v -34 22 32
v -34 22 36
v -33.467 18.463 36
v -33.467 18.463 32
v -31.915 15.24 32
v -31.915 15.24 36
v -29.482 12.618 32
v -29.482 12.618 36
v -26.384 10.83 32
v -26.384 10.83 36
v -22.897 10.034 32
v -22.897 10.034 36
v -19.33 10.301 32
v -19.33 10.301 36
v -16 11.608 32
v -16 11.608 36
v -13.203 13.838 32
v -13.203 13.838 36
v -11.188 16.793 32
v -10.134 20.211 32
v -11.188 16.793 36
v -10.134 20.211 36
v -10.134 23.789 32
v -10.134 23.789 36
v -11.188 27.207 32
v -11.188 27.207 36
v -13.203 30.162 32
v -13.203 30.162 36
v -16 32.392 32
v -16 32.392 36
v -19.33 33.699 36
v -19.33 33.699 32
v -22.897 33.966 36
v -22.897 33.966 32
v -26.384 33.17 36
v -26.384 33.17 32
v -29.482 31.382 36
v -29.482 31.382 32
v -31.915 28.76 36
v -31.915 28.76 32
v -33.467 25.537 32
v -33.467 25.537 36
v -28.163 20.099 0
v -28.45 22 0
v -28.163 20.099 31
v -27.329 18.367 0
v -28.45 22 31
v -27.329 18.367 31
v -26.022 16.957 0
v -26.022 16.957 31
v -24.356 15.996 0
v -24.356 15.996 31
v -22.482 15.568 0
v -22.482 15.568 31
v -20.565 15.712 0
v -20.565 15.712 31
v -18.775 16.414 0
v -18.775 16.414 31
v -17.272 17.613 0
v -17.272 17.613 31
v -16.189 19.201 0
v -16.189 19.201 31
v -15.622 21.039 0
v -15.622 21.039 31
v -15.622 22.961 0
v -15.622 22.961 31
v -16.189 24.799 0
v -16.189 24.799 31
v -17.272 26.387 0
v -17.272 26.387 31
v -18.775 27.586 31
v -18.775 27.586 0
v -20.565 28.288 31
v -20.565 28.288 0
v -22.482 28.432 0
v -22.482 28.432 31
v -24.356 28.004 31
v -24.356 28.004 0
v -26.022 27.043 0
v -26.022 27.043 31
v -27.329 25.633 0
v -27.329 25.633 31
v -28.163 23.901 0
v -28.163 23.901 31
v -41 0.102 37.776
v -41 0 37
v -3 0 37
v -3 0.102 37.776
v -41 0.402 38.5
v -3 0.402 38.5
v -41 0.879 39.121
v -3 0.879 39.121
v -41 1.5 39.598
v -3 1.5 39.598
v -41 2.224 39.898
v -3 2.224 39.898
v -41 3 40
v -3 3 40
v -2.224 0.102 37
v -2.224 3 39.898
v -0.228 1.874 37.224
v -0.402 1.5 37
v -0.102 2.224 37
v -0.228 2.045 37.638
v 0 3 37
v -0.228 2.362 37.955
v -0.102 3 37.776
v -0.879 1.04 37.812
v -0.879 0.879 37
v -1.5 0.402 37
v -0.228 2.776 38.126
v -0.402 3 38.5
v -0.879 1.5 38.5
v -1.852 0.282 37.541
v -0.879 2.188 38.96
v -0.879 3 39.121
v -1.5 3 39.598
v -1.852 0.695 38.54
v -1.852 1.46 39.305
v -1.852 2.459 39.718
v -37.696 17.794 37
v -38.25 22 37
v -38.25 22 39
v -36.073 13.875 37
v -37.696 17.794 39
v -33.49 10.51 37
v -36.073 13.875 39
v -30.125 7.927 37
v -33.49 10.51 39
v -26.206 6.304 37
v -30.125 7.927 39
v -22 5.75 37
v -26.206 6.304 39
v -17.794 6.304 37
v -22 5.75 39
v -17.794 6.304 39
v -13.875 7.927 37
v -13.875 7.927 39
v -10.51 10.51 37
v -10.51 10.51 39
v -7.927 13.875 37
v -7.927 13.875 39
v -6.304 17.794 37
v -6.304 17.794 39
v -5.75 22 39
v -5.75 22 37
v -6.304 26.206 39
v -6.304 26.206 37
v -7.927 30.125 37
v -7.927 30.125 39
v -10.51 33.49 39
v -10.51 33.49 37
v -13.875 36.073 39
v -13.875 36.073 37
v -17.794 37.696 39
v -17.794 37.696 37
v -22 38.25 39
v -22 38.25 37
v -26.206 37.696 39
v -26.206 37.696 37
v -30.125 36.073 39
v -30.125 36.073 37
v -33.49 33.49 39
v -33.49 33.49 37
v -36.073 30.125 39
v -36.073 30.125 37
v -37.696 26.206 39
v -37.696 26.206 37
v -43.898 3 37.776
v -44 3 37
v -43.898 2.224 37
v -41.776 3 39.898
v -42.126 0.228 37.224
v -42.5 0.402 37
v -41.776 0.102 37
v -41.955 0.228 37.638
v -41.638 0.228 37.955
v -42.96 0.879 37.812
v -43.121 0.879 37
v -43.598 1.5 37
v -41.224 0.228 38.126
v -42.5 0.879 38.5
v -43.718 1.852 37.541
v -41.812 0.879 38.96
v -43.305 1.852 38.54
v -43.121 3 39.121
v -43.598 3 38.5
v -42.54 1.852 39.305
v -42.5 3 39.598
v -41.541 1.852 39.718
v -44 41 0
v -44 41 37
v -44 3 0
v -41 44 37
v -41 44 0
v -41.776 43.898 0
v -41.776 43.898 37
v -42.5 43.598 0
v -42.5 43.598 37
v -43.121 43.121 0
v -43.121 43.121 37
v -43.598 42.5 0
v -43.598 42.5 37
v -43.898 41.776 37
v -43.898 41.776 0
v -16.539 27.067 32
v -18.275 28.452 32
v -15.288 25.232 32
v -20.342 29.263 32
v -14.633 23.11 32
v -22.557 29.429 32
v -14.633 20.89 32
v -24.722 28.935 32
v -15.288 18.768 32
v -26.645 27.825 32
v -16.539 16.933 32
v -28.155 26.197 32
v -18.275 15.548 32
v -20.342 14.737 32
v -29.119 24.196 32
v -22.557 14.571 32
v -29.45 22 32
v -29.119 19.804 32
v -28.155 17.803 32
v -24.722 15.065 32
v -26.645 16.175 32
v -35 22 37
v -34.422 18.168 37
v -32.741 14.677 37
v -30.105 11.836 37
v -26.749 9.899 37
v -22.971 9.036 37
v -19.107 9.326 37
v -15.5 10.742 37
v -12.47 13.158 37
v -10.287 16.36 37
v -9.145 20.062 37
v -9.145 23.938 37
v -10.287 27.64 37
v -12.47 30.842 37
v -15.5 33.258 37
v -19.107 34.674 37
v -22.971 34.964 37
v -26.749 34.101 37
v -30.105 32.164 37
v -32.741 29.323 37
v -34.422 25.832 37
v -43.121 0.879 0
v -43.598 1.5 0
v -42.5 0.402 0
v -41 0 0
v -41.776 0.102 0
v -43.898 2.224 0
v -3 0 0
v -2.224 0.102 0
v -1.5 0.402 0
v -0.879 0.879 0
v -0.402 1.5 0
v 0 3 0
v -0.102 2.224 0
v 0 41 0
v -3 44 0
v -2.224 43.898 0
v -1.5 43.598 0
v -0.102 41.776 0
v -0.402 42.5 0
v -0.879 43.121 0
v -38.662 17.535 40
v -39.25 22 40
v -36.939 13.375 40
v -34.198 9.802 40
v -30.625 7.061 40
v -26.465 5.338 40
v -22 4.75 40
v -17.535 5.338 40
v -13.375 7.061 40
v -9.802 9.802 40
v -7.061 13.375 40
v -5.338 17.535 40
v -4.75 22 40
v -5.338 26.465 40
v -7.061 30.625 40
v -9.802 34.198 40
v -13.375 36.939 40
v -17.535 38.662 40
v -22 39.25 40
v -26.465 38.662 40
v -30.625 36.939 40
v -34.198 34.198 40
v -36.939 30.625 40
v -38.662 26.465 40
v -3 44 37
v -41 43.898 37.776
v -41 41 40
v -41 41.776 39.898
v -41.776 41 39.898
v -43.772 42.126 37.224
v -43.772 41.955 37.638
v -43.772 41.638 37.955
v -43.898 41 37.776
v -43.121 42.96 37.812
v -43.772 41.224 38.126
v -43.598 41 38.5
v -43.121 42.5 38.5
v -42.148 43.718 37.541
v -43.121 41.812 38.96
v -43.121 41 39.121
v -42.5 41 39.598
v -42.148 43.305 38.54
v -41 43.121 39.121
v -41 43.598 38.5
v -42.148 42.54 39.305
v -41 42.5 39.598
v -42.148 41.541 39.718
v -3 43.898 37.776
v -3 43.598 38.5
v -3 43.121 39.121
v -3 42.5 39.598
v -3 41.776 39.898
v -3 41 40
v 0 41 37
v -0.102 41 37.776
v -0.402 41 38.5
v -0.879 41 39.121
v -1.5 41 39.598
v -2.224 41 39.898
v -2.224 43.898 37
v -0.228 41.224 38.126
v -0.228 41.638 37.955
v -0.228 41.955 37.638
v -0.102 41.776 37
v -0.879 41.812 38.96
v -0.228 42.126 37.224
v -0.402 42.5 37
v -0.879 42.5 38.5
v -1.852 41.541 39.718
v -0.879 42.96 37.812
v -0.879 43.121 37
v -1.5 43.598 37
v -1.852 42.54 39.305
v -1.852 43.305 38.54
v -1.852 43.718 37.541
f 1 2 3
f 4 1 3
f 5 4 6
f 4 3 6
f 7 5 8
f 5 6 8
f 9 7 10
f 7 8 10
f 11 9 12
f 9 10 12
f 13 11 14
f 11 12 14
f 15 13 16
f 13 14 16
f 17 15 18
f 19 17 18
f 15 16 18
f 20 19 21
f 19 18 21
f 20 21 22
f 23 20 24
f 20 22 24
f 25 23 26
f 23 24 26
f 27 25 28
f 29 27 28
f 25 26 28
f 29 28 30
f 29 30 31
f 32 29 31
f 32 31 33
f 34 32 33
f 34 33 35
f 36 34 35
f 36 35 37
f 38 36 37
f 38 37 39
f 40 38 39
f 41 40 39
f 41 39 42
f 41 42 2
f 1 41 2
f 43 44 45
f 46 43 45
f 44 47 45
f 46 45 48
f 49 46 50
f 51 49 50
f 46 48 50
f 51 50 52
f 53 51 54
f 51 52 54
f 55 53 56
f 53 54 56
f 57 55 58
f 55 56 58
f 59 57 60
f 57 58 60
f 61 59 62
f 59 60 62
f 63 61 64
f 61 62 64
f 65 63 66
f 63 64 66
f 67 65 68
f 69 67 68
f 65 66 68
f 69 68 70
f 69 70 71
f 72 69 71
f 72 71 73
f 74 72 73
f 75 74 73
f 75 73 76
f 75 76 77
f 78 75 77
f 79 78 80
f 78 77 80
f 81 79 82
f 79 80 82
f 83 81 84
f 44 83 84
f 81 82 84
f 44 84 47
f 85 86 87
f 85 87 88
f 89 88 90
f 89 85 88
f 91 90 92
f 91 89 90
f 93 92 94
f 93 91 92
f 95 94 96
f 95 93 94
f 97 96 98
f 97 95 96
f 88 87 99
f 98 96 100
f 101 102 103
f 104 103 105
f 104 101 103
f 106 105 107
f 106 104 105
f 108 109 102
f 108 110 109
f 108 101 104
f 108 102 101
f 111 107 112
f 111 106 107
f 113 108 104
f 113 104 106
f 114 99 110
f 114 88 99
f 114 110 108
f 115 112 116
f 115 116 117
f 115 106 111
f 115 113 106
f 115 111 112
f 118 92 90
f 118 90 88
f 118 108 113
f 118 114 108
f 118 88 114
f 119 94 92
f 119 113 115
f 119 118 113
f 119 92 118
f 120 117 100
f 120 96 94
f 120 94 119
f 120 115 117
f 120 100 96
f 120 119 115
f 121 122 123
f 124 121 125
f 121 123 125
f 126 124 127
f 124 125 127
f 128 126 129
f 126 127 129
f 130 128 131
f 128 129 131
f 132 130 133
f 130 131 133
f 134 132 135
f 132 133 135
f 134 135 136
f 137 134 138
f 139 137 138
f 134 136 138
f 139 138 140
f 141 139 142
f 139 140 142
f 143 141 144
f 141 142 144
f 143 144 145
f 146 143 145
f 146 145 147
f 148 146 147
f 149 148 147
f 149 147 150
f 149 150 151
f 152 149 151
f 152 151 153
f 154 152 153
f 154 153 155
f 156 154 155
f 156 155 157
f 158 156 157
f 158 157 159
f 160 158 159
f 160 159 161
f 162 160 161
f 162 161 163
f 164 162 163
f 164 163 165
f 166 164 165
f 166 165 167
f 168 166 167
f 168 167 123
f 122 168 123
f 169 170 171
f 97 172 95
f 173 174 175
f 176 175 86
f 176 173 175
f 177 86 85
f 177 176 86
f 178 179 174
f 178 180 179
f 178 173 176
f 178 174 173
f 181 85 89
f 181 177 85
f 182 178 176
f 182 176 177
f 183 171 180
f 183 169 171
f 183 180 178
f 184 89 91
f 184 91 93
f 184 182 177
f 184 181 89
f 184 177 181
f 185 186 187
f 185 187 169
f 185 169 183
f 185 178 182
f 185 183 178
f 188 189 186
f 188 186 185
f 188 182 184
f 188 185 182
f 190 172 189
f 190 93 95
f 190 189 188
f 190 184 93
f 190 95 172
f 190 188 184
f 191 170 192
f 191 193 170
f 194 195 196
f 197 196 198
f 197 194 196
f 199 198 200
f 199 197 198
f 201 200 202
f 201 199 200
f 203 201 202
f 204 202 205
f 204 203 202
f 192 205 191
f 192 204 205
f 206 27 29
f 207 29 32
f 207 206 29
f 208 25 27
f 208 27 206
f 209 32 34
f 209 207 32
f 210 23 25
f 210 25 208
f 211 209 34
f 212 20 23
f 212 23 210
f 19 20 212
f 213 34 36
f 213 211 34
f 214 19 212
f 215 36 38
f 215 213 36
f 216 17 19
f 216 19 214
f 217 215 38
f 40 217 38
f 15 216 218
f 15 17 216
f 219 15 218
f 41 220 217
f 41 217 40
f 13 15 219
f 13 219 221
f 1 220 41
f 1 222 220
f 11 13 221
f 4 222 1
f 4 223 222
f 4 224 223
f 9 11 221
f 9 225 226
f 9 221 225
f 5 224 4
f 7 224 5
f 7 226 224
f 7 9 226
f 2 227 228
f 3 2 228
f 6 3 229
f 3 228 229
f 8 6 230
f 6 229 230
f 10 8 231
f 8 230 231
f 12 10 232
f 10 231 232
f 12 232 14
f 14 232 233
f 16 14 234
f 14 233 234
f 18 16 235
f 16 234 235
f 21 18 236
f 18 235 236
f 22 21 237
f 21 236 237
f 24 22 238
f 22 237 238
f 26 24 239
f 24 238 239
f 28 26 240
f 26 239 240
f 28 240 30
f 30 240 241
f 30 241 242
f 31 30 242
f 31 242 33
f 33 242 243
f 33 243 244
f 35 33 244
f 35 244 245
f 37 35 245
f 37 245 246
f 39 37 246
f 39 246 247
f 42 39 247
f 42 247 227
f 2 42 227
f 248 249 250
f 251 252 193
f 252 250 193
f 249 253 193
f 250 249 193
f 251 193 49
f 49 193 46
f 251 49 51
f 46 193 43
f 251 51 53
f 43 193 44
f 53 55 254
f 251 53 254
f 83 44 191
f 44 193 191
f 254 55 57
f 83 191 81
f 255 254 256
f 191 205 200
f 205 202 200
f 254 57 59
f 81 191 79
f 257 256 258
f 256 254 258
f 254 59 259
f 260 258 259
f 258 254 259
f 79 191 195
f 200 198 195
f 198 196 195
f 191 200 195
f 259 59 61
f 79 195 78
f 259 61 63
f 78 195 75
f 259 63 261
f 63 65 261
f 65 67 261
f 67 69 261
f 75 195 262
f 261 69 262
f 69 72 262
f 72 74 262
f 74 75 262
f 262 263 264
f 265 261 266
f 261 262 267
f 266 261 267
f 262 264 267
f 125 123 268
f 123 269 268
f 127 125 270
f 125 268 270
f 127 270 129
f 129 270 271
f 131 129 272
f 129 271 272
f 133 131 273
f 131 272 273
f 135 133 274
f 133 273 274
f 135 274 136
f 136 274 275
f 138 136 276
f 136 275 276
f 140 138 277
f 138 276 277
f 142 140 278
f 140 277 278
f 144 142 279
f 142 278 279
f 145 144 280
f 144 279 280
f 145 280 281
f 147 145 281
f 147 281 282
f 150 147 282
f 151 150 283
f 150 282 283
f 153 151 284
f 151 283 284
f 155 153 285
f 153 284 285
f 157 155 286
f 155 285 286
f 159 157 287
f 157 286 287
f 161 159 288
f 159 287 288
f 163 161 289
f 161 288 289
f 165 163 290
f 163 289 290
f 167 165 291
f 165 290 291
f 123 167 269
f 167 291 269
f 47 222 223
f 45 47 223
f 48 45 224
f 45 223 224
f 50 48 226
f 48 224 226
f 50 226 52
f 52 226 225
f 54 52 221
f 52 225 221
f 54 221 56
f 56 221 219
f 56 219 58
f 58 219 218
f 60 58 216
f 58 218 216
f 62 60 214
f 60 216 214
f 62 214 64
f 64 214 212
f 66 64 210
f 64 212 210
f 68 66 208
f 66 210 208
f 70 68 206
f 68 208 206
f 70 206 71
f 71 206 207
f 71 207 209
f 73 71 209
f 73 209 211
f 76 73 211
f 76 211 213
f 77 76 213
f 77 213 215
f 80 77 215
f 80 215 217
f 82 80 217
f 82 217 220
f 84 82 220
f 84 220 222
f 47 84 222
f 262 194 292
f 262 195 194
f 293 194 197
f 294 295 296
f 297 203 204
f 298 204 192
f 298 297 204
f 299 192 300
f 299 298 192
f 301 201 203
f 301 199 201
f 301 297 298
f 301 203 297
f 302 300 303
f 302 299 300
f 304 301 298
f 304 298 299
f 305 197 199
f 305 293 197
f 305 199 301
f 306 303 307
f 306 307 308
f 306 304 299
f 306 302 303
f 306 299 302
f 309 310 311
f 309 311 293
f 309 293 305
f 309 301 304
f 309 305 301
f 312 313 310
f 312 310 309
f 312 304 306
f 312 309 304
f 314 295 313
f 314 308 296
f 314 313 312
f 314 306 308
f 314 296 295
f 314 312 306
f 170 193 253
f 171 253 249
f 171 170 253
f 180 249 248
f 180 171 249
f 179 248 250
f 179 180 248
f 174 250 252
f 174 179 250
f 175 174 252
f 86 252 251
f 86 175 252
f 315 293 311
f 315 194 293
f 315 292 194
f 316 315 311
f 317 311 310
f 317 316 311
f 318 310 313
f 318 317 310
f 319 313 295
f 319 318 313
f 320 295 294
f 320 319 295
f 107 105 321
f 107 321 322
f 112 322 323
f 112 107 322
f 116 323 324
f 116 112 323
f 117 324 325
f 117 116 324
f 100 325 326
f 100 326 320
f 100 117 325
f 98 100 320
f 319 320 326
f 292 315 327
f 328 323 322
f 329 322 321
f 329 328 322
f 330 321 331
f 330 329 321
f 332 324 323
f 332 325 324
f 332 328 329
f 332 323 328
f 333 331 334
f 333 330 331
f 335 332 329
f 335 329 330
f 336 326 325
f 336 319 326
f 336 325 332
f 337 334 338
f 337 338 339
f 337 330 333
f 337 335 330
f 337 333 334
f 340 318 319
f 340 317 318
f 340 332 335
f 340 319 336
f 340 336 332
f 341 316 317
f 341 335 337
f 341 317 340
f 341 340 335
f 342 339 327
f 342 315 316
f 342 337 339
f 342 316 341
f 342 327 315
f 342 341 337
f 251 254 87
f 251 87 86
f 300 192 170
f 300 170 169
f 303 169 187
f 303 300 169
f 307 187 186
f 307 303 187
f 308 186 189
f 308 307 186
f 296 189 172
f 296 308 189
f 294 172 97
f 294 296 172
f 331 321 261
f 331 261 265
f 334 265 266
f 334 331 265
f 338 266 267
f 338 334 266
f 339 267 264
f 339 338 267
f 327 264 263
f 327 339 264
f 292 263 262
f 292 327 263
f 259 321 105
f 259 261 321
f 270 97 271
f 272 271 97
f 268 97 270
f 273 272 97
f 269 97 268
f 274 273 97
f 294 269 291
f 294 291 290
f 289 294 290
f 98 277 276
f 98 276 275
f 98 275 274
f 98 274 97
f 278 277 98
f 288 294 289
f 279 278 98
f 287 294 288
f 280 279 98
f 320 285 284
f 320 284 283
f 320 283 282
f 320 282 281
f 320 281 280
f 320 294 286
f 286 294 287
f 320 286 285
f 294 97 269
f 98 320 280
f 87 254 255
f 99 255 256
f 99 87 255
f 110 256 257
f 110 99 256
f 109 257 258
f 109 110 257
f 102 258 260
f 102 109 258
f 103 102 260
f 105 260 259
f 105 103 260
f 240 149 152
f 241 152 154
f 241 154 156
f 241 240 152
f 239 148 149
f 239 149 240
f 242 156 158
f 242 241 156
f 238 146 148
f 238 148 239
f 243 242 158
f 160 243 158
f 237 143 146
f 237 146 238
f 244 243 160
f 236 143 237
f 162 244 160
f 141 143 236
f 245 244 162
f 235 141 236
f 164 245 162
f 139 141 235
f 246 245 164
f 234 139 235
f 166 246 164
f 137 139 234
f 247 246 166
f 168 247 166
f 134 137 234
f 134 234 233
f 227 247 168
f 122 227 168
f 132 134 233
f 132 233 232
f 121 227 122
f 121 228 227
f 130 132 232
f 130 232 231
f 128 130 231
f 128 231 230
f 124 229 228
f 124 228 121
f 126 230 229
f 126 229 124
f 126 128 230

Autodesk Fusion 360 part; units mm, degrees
sketch "Sketch1" plane through (0, 0, 0) normal (0, 0, 1) x (1, 0, 0)
  line L0 (0, 0) -> (-44, 0)
  line L1 (-44, 0) -> (-44, 44)
  line L2 (-44, 44) -> (0, 44)
  line L3 (0, 44) -> (0, 0)
  dimension "d1" = 44
  dimension "d2" = 44
extrude "Extrude1" add sketch "Sketch1" along normal blind 40
sketch "Sketch2" plane through (0, 0, 40) normal (0, 0, 1) x (-1, 0, 0)
  line L0 (0, -44) -> (44, -44)
  line L1 (44, -44) -> (44, 0)
  line L2 (44, 0) -> (0, 0)
  line L3 (0, 0) -> (0, -44)
  line L4 (44, -44) -> (0, 0)
  line L5 (0, -44) -> (44, 0)
  circle A0 centre (22, -22) radius 16.25
  dimension "d5" = 32.5
extrude "Extrude2" cut sketch "Sketch2" against normal blind 3 contours L4 L5 A0 | L4 L5 A0 | L4 L5 A0 | L4 L5 A0
sketch "Sketch3" plane through (0, 0, 37) normal (0, 0, 1) x (-1, 0, 0)
  circle A0 centre (22, -22) radius 16.25
  circle A1 centre (22, -22) radius 12
  dimension "d8" = 24
extrude "Extrude3" cut sketch "Sketch3" against normal blind 5 contours A1
sketch "Sketch4" plane through (0, 0, 32) normal (0, 0, 1) x (-1, 0, 0)
  circle A0 centre (22, -22) radius 12
  circle A1 centre (22, -22) radius 6.45
  dimension "d11" = 12.9
extrude "Extrude4" cut sketch "Sketch4" against normal blind 50 contours A1
fillet "Fillet1" radius 3 8 edges at (-22, 44, 40) (-44, 22, 40) (-22, 0, 40) (0, 22, 40) (0, 0, 20) (-44, 0, 20) (0, 44, 20) (-44, 44, 20)
chamfer "Chamfer1" distance 1 angle 45 3 edges at (-10.8121, 17.6606, 37) (-15.9865, 19.6676, 32) (-6.8497, 16.1237, 40)
